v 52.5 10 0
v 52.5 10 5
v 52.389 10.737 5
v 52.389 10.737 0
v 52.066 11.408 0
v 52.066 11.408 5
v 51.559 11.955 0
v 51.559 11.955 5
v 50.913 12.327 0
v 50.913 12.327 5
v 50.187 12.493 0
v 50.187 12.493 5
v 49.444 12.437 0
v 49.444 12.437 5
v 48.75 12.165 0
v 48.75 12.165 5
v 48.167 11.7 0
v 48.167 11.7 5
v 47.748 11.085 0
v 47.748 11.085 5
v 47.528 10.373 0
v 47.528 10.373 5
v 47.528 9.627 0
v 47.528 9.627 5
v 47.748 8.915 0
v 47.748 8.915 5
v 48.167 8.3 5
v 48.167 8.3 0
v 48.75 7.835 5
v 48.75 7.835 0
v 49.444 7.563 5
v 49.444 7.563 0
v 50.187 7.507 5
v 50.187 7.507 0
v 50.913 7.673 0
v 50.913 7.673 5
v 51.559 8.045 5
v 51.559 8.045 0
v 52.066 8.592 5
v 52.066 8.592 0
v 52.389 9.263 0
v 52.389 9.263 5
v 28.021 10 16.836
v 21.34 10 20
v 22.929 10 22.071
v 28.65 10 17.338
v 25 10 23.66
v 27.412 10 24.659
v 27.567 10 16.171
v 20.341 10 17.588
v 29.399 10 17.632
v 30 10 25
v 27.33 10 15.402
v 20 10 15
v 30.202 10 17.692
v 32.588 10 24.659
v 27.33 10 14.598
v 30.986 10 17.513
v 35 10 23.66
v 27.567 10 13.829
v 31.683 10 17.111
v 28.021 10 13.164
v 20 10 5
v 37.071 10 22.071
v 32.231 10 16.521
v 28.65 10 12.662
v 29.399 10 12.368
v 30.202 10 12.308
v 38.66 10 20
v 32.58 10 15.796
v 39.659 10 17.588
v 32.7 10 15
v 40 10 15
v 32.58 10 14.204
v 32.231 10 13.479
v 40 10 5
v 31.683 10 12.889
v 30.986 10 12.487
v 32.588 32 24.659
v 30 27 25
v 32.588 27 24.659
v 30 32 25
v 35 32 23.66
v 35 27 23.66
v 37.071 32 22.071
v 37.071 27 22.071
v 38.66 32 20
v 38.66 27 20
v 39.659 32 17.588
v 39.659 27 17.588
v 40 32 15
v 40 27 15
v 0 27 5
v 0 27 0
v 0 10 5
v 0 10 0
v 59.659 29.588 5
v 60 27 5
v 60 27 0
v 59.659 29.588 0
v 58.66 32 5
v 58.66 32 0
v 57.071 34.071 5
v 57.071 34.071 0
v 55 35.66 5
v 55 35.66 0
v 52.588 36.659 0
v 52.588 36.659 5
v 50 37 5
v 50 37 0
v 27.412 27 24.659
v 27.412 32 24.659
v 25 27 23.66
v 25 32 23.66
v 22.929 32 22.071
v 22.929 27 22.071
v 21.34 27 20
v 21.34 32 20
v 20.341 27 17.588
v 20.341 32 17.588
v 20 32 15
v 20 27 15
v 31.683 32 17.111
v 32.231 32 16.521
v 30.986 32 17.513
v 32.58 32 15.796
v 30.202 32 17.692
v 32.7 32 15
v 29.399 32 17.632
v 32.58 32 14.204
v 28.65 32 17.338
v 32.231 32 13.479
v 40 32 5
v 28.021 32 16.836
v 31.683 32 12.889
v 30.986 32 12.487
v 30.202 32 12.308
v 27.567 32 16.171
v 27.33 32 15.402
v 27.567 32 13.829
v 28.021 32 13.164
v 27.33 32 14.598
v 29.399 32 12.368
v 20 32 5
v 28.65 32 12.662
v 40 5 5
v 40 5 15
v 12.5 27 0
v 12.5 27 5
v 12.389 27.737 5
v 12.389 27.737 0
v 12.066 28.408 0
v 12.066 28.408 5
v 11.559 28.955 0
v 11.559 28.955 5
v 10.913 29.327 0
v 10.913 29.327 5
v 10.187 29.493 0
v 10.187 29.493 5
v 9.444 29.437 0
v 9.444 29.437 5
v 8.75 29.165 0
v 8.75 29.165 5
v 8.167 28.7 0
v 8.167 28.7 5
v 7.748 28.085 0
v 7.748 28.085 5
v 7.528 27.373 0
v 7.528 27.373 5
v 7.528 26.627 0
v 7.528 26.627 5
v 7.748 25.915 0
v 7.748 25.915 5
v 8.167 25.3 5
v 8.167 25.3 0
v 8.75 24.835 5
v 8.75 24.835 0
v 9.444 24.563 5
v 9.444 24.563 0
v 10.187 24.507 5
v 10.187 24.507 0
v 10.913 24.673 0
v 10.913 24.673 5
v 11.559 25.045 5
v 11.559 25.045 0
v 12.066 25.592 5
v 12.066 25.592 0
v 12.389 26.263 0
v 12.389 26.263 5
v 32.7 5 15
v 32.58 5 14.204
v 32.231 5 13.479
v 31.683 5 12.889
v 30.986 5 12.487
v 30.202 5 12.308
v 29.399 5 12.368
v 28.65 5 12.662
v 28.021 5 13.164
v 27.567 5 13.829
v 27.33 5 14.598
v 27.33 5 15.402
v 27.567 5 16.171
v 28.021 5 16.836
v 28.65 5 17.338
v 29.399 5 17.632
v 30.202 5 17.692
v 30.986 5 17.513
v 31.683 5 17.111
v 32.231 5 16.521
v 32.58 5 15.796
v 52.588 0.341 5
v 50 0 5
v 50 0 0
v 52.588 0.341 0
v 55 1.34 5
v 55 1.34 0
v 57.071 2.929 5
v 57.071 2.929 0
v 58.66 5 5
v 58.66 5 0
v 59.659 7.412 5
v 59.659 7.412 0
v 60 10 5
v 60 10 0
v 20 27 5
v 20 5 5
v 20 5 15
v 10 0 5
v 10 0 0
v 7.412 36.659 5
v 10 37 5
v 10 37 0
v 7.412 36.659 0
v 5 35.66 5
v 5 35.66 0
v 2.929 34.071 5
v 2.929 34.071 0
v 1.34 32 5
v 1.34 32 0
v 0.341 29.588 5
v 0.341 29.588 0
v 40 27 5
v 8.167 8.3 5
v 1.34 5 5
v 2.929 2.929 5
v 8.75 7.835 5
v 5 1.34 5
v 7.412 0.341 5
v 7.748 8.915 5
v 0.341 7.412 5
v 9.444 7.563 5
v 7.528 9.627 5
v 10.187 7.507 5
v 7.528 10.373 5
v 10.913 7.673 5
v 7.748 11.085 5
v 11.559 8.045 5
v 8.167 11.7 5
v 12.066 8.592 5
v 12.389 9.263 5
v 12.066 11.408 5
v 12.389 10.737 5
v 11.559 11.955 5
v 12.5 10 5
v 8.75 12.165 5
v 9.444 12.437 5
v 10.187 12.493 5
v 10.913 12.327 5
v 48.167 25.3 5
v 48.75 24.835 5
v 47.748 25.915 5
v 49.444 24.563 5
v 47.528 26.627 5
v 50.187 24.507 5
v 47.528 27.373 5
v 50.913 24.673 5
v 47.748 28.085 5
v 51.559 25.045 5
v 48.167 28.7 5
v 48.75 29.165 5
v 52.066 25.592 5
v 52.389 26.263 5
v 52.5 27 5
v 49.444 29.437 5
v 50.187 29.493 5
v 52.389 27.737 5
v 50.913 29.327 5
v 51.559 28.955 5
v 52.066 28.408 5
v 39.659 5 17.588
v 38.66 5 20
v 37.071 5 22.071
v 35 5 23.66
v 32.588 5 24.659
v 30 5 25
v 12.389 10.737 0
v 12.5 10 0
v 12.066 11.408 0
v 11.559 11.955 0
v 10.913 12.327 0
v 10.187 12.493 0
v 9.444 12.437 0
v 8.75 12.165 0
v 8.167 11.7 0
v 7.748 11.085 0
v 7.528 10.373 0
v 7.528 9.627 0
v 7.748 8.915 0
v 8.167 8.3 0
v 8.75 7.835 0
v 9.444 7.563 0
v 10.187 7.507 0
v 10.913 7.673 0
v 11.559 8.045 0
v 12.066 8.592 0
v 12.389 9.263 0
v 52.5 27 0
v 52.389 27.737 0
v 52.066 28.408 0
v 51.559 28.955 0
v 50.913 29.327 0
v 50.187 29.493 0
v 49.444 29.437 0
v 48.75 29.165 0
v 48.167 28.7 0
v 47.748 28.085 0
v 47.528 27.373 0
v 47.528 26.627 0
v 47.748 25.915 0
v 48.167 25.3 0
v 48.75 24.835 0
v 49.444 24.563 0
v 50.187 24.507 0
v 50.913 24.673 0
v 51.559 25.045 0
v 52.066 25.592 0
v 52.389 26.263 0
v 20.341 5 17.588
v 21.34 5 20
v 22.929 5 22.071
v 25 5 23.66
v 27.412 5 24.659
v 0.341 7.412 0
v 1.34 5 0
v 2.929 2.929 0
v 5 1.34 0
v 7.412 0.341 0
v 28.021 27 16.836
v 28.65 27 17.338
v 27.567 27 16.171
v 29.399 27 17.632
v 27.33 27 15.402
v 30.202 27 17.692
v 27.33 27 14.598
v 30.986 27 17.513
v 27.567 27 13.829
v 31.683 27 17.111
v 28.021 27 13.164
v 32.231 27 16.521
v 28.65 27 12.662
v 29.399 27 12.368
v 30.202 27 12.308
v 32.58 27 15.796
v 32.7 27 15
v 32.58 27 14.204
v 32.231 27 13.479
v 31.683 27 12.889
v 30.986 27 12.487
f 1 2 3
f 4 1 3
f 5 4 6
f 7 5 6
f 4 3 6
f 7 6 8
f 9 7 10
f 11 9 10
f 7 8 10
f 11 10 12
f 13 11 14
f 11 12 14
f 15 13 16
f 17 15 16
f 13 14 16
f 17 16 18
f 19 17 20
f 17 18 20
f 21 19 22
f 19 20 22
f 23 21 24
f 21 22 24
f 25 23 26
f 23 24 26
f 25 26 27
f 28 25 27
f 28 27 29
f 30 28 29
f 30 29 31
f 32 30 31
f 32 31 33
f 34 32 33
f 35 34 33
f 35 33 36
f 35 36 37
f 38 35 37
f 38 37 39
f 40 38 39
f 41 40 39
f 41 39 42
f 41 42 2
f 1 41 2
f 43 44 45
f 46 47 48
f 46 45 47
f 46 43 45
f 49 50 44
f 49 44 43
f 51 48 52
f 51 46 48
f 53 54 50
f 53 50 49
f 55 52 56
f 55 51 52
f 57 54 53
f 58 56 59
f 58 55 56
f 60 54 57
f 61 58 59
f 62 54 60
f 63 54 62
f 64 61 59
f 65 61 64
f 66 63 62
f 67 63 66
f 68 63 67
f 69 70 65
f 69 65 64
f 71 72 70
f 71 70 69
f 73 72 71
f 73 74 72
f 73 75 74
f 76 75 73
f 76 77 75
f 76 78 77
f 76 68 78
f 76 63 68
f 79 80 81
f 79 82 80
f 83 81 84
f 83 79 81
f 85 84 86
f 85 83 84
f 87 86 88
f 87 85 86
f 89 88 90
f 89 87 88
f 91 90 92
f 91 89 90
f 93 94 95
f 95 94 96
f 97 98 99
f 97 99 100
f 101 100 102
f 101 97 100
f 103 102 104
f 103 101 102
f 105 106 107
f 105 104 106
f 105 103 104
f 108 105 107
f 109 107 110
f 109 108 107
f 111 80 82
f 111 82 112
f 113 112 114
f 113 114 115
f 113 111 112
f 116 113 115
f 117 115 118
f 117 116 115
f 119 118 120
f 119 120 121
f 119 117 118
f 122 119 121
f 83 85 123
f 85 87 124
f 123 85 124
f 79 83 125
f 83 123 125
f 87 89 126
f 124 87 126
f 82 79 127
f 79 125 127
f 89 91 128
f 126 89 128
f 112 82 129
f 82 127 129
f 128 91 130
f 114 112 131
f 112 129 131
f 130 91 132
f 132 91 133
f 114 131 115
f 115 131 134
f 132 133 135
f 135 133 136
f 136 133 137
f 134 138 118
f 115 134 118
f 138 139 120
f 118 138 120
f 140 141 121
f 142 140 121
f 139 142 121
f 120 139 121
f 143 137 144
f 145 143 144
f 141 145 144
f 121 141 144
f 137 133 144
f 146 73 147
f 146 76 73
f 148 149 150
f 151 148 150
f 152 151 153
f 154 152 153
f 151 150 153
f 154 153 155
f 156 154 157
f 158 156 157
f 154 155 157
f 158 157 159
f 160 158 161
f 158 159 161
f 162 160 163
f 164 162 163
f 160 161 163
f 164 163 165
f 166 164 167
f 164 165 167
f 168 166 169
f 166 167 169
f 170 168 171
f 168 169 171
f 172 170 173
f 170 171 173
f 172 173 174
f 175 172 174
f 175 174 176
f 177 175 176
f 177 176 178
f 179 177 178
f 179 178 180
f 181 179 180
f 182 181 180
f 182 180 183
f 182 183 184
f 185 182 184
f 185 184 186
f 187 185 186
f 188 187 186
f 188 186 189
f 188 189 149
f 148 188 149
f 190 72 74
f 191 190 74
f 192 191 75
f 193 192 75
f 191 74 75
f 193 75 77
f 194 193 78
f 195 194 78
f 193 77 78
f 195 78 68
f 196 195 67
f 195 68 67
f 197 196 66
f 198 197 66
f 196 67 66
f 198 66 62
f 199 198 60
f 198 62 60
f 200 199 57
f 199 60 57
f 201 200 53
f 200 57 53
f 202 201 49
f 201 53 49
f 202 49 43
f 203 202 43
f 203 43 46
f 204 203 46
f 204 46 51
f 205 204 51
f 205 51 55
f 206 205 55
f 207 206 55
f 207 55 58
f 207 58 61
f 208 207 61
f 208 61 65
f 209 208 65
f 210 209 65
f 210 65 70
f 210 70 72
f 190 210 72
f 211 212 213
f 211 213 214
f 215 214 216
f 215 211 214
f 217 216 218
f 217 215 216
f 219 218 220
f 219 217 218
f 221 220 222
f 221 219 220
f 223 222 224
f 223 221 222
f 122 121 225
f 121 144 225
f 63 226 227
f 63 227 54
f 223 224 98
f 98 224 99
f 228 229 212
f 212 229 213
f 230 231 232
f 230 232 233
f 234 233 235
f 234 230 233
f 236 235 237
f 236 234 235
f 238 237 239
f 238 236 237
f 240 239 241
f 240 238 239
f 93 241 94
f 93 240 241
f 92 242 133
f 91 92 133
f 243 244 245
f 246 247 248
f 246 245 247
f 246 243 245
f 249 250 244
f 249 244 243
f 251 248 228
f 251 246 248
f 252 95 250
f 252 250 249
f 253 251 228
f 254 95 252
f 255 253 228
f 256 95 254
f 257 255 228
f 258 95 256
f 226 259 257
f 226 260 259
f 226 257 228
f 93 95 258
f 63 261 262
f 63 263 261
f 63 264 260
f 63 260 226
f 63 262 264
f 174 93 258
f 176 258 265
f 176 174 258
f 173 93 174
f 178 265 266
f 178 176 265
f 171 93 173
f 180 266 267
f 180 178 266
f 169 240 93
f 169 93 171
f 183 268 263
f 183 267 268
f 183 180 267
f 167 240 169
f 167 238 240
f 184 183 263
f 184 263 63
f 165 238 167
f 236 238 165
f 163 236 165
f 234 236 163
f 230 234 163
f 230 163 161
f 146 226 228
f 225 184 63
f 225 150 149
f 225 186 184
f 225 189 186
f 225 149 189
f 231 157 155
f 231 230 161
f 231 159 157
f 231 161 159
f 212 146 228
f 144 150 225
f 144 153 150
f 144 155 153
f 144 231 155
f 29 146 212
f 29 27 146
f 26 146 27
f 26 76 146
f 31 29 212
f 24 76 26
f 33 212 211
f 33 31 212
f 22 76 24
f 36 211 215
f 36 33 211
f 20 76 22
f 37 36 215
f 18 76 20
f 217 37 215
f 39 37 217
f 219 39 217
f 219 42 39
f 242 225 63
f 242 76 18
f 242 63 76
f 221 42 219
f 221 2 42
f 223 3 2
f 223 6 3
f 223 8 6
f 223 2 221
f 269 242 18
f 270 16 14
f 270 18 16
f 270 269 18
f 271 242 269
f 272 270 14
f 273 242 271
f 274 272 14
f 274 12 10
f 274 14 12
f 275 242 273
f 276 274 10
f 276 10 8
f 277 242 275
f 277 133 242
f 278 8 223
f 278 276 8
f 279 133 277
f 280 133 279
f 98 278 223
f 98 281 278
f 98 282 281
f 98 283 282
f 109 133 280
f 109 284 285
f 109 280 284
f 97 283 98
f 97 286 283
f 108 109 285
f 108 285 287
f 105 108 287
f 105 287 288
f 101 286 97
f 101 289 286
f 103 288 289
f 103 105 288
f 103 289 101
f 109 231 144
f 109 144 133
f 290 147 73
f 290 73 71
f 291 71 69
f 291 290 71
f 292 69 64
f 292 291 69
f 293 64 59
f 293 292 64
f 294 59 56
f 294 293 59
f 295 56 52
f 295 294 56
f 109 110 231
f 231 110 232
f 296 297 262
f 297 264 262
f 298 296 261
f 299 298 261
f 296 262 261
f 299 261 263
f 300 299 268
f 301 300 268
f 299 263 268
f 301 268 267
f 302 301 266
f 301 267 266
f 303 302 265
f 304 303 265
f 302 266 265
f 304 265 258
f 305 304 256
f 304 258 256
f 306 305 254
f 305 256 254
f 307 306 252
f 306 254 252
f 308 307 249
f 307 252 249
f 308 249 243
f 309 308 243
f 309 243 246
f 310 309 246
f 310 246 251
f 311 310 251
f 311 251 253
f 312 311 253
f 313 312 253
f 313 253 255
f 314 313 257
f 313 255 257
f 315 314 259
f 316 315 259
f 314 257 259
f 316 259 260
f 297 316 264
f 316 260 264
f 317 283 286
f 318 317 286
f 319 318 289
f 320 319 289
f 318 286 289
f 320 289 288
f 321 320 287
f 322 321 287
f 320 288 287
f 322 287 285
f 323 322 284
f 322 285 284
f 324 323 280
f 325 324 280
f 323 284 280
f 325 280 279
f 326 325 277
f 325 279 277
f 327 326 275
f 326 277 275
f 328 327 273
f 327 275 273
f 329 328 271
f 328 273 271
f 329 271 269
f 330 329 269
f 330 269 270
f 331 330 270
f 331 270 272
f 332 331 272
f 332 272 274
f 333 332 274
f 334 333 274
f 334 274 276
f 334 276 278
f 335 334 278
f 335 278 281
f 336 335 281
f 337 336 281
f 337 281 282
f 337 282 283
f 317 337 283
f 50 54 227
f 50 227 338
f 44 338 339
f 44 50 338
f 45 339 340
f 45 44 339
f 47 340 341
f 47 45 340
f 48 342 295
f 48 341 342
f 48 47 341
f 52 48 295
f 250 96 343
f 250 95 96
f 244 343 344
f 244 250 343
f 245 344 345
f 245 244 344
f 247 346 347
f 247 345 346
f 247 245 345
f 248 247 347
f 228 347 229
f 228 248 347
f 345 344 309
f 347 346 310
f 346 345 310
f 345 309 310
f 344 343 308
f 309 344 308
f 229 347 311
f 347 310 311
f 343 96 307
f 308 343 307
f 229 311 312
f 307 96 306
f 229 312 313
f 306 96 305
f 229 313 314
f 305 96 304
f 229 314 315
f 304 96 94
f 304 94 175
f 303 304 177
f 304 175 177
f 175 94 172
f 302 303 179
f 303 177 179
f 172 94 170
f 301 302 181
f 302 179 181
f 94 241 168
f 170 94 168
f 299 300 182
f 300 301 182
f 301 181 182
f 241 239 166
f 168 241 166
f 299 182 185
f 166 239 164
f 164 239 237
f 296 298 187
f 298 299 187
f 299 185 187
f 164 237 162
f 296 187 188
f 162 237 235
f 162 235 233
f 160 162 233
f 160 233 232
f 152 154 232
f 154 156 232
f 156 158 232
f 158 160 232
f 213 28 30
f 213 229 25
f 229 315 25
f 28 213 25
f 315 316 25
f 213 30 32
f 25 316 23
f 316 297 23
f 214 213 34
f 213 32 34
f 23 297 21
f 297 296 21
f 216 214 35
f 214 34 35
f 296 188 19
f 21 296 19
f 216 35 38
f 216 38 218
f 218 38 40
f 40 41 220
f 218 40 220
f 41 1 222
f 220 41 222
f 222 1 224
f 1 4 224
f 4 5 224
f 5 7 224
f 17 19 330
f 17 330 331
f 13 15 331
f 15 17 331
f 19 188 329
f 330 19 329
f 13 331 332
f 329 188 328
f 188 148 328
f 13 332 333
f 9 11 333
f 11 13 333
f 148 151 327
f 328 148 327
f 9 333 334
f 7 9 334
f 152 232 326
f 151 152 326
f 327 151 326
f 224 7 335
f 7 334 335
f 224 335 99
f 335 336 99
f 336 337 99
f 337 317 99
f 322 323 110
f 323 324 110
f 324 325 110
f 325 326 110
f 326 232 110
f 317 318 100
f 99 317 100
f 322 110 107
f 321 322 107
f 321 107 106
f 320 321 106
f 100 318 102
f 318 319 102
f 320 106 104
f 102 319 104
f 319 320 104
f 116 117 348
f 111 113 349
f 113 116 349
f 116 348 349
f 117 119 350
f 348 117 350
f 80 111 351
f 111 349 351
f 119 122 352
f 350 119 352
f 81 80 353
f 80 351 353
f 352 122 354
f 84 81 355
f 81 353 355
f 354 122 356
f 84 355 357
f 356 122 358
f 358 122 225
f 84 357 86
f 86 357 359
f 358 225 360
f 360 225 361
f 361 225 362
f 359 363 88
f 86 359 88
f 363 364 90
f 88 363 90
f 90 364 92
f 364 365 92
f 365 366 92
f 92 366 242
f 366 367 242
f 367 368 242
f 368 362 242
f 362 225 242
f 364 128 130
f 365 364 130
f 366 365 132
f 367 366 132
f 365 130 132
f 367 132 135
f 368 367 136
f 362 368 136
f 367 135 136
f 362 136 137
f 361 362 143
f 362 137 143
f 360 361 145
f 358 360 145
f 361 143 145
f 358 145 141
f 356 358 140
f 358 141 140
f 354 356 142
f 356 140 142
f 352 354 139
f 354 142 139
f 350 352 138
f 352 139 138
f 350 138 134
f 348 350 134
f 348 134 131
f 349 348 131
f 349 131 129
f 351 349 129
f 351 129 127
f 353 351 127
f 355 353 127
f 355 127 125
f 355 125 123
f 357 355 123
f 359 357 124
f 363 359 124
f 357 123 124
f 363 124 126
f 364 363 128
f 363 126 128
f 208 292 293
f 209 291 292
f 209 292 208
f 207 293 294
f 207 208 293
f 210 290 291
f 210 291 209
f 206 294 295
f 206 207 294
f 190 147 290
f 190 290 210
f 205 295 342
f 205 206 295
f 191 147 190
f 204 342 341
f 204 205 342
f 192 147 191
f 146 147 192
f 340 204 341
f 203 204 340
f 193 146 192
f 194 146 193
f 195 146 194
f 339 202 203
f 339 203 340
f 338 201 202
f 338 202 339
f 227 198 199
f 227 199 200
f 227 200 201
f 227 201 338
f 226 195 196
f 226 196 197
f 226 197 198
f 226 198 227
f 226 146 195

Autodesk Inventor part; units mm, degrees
ref_plane "YZ Plane" through (0, 0, 0) normal (1, 0, 0) x (0, 1, 0)
ref_plane "XZ Plane" through (0, 0, 0) normal (0, 1, 0) x (-1, 0, 0)
ref_plane "XY Plane" through (0, 0, 0) normal (0, 0, 1) x (1, 0, 0)
sketch "Sketch1" plane through (0, 0, 0) normal (0, 0, 1) x (1, 0, 0)
  line L0 (0, 0) -> (60, 0)
  line L1 (60, 0) -> (60, 37)
  line L2 (60, 37) -> (0, 37)
  line L3 (0, 37) -> (0, 0)
  dimension "d0" = 60
  dimension "d1" = 37
extrude "Extrusion1" add sketch "Sketch1" along normal blind 5
sketch "Sketch2" plane through (0, 0, 5) normal (0, 0, 1) x (1, 0, 0)
  line L0 (20, 27) -> (40, 27)
  line L1 (40, 27) -> (40, 32)
  line L2 (40, 32) -> (20, 32)
  line L3 (20, 32) -> (20, 27)
  line L4 (20, 10) -> (40, 10)
  line L5 (40, 10) -> (40, 5)
  line L6 (40, 5) -> (20, 5)
  line L7 (20, 5) -> (20, 10)
  point P0 (0, 0)
  dimension "d6" = 20
  dimension "d7" = 5
  dimension "d8" = 20
  dimension "d9" = 5
extrude "Extrusion2" add sketch "Sketch2" along normal blind 20
sketch "Sketch3" plane through (20, 32, 5) normal (0, 1, 0) x (1, 0, 0)
  circle A0 centre (10, -10) radius 2.7
  point P0 (-20, 5)
  dimension "d12" = 5.4
extrude "Extrusion3" cut sketch "Sketch3" against normal blind 20
sketch "Sketch4" plane through (20, 10, 5) normal (0, 1, 0) x (1, 0, 0)
  circle A0 centre (10, -10) radius 2.7
  point P0 (-20, 5)
  dimension "d15" = 5.4
extrude "Extrusion4" cut sketch "Sketch4" against normal blind 20
fillet "Fillet1" radius 10 1 edges at (40, 29.5, 25)
fillet "Fillet2" radius 10 1 edges at (20, 29.5, 25)
fillet "Fillet3" radius 10 1 edges at (40, 7.5, 25)
fillet "Fillet4" radius 10 1 edges at (20, 7.5, 25)
sketch "Sketch5" plane through (0, 0, 5) normal (0, 0, 1) x (1, 0, 0)
  circle A0 centre (10, 10) radius 2.5
  circle A1 centre (50, 10) radius 2.5
  circle A2 centre (10, 27) radius 2.5
  circle A3 centre (50, 27) radius 2.5
  point P0 (0, 0)
  dimension "d22" = 5
  dimension "d23" = 5
  dimension "d24" = 5
  dimension "d25" = 5
extrude "Extrusion5" cut sketch "Sketch5" against normal blind 20
fillet "Fillet5" radius 10 1 edges at (0, 37, 2.5)
fillet "Fillet6" radius 10 1 edges at (60, 37, 2.5)
fillet "Fillet7" radius 10 1 edges at (60, 0, 2.5)
fillet "Fillet8" radius 10 1 edges at (0, 0, 2.5)
properties part number "sail_hold_1"
